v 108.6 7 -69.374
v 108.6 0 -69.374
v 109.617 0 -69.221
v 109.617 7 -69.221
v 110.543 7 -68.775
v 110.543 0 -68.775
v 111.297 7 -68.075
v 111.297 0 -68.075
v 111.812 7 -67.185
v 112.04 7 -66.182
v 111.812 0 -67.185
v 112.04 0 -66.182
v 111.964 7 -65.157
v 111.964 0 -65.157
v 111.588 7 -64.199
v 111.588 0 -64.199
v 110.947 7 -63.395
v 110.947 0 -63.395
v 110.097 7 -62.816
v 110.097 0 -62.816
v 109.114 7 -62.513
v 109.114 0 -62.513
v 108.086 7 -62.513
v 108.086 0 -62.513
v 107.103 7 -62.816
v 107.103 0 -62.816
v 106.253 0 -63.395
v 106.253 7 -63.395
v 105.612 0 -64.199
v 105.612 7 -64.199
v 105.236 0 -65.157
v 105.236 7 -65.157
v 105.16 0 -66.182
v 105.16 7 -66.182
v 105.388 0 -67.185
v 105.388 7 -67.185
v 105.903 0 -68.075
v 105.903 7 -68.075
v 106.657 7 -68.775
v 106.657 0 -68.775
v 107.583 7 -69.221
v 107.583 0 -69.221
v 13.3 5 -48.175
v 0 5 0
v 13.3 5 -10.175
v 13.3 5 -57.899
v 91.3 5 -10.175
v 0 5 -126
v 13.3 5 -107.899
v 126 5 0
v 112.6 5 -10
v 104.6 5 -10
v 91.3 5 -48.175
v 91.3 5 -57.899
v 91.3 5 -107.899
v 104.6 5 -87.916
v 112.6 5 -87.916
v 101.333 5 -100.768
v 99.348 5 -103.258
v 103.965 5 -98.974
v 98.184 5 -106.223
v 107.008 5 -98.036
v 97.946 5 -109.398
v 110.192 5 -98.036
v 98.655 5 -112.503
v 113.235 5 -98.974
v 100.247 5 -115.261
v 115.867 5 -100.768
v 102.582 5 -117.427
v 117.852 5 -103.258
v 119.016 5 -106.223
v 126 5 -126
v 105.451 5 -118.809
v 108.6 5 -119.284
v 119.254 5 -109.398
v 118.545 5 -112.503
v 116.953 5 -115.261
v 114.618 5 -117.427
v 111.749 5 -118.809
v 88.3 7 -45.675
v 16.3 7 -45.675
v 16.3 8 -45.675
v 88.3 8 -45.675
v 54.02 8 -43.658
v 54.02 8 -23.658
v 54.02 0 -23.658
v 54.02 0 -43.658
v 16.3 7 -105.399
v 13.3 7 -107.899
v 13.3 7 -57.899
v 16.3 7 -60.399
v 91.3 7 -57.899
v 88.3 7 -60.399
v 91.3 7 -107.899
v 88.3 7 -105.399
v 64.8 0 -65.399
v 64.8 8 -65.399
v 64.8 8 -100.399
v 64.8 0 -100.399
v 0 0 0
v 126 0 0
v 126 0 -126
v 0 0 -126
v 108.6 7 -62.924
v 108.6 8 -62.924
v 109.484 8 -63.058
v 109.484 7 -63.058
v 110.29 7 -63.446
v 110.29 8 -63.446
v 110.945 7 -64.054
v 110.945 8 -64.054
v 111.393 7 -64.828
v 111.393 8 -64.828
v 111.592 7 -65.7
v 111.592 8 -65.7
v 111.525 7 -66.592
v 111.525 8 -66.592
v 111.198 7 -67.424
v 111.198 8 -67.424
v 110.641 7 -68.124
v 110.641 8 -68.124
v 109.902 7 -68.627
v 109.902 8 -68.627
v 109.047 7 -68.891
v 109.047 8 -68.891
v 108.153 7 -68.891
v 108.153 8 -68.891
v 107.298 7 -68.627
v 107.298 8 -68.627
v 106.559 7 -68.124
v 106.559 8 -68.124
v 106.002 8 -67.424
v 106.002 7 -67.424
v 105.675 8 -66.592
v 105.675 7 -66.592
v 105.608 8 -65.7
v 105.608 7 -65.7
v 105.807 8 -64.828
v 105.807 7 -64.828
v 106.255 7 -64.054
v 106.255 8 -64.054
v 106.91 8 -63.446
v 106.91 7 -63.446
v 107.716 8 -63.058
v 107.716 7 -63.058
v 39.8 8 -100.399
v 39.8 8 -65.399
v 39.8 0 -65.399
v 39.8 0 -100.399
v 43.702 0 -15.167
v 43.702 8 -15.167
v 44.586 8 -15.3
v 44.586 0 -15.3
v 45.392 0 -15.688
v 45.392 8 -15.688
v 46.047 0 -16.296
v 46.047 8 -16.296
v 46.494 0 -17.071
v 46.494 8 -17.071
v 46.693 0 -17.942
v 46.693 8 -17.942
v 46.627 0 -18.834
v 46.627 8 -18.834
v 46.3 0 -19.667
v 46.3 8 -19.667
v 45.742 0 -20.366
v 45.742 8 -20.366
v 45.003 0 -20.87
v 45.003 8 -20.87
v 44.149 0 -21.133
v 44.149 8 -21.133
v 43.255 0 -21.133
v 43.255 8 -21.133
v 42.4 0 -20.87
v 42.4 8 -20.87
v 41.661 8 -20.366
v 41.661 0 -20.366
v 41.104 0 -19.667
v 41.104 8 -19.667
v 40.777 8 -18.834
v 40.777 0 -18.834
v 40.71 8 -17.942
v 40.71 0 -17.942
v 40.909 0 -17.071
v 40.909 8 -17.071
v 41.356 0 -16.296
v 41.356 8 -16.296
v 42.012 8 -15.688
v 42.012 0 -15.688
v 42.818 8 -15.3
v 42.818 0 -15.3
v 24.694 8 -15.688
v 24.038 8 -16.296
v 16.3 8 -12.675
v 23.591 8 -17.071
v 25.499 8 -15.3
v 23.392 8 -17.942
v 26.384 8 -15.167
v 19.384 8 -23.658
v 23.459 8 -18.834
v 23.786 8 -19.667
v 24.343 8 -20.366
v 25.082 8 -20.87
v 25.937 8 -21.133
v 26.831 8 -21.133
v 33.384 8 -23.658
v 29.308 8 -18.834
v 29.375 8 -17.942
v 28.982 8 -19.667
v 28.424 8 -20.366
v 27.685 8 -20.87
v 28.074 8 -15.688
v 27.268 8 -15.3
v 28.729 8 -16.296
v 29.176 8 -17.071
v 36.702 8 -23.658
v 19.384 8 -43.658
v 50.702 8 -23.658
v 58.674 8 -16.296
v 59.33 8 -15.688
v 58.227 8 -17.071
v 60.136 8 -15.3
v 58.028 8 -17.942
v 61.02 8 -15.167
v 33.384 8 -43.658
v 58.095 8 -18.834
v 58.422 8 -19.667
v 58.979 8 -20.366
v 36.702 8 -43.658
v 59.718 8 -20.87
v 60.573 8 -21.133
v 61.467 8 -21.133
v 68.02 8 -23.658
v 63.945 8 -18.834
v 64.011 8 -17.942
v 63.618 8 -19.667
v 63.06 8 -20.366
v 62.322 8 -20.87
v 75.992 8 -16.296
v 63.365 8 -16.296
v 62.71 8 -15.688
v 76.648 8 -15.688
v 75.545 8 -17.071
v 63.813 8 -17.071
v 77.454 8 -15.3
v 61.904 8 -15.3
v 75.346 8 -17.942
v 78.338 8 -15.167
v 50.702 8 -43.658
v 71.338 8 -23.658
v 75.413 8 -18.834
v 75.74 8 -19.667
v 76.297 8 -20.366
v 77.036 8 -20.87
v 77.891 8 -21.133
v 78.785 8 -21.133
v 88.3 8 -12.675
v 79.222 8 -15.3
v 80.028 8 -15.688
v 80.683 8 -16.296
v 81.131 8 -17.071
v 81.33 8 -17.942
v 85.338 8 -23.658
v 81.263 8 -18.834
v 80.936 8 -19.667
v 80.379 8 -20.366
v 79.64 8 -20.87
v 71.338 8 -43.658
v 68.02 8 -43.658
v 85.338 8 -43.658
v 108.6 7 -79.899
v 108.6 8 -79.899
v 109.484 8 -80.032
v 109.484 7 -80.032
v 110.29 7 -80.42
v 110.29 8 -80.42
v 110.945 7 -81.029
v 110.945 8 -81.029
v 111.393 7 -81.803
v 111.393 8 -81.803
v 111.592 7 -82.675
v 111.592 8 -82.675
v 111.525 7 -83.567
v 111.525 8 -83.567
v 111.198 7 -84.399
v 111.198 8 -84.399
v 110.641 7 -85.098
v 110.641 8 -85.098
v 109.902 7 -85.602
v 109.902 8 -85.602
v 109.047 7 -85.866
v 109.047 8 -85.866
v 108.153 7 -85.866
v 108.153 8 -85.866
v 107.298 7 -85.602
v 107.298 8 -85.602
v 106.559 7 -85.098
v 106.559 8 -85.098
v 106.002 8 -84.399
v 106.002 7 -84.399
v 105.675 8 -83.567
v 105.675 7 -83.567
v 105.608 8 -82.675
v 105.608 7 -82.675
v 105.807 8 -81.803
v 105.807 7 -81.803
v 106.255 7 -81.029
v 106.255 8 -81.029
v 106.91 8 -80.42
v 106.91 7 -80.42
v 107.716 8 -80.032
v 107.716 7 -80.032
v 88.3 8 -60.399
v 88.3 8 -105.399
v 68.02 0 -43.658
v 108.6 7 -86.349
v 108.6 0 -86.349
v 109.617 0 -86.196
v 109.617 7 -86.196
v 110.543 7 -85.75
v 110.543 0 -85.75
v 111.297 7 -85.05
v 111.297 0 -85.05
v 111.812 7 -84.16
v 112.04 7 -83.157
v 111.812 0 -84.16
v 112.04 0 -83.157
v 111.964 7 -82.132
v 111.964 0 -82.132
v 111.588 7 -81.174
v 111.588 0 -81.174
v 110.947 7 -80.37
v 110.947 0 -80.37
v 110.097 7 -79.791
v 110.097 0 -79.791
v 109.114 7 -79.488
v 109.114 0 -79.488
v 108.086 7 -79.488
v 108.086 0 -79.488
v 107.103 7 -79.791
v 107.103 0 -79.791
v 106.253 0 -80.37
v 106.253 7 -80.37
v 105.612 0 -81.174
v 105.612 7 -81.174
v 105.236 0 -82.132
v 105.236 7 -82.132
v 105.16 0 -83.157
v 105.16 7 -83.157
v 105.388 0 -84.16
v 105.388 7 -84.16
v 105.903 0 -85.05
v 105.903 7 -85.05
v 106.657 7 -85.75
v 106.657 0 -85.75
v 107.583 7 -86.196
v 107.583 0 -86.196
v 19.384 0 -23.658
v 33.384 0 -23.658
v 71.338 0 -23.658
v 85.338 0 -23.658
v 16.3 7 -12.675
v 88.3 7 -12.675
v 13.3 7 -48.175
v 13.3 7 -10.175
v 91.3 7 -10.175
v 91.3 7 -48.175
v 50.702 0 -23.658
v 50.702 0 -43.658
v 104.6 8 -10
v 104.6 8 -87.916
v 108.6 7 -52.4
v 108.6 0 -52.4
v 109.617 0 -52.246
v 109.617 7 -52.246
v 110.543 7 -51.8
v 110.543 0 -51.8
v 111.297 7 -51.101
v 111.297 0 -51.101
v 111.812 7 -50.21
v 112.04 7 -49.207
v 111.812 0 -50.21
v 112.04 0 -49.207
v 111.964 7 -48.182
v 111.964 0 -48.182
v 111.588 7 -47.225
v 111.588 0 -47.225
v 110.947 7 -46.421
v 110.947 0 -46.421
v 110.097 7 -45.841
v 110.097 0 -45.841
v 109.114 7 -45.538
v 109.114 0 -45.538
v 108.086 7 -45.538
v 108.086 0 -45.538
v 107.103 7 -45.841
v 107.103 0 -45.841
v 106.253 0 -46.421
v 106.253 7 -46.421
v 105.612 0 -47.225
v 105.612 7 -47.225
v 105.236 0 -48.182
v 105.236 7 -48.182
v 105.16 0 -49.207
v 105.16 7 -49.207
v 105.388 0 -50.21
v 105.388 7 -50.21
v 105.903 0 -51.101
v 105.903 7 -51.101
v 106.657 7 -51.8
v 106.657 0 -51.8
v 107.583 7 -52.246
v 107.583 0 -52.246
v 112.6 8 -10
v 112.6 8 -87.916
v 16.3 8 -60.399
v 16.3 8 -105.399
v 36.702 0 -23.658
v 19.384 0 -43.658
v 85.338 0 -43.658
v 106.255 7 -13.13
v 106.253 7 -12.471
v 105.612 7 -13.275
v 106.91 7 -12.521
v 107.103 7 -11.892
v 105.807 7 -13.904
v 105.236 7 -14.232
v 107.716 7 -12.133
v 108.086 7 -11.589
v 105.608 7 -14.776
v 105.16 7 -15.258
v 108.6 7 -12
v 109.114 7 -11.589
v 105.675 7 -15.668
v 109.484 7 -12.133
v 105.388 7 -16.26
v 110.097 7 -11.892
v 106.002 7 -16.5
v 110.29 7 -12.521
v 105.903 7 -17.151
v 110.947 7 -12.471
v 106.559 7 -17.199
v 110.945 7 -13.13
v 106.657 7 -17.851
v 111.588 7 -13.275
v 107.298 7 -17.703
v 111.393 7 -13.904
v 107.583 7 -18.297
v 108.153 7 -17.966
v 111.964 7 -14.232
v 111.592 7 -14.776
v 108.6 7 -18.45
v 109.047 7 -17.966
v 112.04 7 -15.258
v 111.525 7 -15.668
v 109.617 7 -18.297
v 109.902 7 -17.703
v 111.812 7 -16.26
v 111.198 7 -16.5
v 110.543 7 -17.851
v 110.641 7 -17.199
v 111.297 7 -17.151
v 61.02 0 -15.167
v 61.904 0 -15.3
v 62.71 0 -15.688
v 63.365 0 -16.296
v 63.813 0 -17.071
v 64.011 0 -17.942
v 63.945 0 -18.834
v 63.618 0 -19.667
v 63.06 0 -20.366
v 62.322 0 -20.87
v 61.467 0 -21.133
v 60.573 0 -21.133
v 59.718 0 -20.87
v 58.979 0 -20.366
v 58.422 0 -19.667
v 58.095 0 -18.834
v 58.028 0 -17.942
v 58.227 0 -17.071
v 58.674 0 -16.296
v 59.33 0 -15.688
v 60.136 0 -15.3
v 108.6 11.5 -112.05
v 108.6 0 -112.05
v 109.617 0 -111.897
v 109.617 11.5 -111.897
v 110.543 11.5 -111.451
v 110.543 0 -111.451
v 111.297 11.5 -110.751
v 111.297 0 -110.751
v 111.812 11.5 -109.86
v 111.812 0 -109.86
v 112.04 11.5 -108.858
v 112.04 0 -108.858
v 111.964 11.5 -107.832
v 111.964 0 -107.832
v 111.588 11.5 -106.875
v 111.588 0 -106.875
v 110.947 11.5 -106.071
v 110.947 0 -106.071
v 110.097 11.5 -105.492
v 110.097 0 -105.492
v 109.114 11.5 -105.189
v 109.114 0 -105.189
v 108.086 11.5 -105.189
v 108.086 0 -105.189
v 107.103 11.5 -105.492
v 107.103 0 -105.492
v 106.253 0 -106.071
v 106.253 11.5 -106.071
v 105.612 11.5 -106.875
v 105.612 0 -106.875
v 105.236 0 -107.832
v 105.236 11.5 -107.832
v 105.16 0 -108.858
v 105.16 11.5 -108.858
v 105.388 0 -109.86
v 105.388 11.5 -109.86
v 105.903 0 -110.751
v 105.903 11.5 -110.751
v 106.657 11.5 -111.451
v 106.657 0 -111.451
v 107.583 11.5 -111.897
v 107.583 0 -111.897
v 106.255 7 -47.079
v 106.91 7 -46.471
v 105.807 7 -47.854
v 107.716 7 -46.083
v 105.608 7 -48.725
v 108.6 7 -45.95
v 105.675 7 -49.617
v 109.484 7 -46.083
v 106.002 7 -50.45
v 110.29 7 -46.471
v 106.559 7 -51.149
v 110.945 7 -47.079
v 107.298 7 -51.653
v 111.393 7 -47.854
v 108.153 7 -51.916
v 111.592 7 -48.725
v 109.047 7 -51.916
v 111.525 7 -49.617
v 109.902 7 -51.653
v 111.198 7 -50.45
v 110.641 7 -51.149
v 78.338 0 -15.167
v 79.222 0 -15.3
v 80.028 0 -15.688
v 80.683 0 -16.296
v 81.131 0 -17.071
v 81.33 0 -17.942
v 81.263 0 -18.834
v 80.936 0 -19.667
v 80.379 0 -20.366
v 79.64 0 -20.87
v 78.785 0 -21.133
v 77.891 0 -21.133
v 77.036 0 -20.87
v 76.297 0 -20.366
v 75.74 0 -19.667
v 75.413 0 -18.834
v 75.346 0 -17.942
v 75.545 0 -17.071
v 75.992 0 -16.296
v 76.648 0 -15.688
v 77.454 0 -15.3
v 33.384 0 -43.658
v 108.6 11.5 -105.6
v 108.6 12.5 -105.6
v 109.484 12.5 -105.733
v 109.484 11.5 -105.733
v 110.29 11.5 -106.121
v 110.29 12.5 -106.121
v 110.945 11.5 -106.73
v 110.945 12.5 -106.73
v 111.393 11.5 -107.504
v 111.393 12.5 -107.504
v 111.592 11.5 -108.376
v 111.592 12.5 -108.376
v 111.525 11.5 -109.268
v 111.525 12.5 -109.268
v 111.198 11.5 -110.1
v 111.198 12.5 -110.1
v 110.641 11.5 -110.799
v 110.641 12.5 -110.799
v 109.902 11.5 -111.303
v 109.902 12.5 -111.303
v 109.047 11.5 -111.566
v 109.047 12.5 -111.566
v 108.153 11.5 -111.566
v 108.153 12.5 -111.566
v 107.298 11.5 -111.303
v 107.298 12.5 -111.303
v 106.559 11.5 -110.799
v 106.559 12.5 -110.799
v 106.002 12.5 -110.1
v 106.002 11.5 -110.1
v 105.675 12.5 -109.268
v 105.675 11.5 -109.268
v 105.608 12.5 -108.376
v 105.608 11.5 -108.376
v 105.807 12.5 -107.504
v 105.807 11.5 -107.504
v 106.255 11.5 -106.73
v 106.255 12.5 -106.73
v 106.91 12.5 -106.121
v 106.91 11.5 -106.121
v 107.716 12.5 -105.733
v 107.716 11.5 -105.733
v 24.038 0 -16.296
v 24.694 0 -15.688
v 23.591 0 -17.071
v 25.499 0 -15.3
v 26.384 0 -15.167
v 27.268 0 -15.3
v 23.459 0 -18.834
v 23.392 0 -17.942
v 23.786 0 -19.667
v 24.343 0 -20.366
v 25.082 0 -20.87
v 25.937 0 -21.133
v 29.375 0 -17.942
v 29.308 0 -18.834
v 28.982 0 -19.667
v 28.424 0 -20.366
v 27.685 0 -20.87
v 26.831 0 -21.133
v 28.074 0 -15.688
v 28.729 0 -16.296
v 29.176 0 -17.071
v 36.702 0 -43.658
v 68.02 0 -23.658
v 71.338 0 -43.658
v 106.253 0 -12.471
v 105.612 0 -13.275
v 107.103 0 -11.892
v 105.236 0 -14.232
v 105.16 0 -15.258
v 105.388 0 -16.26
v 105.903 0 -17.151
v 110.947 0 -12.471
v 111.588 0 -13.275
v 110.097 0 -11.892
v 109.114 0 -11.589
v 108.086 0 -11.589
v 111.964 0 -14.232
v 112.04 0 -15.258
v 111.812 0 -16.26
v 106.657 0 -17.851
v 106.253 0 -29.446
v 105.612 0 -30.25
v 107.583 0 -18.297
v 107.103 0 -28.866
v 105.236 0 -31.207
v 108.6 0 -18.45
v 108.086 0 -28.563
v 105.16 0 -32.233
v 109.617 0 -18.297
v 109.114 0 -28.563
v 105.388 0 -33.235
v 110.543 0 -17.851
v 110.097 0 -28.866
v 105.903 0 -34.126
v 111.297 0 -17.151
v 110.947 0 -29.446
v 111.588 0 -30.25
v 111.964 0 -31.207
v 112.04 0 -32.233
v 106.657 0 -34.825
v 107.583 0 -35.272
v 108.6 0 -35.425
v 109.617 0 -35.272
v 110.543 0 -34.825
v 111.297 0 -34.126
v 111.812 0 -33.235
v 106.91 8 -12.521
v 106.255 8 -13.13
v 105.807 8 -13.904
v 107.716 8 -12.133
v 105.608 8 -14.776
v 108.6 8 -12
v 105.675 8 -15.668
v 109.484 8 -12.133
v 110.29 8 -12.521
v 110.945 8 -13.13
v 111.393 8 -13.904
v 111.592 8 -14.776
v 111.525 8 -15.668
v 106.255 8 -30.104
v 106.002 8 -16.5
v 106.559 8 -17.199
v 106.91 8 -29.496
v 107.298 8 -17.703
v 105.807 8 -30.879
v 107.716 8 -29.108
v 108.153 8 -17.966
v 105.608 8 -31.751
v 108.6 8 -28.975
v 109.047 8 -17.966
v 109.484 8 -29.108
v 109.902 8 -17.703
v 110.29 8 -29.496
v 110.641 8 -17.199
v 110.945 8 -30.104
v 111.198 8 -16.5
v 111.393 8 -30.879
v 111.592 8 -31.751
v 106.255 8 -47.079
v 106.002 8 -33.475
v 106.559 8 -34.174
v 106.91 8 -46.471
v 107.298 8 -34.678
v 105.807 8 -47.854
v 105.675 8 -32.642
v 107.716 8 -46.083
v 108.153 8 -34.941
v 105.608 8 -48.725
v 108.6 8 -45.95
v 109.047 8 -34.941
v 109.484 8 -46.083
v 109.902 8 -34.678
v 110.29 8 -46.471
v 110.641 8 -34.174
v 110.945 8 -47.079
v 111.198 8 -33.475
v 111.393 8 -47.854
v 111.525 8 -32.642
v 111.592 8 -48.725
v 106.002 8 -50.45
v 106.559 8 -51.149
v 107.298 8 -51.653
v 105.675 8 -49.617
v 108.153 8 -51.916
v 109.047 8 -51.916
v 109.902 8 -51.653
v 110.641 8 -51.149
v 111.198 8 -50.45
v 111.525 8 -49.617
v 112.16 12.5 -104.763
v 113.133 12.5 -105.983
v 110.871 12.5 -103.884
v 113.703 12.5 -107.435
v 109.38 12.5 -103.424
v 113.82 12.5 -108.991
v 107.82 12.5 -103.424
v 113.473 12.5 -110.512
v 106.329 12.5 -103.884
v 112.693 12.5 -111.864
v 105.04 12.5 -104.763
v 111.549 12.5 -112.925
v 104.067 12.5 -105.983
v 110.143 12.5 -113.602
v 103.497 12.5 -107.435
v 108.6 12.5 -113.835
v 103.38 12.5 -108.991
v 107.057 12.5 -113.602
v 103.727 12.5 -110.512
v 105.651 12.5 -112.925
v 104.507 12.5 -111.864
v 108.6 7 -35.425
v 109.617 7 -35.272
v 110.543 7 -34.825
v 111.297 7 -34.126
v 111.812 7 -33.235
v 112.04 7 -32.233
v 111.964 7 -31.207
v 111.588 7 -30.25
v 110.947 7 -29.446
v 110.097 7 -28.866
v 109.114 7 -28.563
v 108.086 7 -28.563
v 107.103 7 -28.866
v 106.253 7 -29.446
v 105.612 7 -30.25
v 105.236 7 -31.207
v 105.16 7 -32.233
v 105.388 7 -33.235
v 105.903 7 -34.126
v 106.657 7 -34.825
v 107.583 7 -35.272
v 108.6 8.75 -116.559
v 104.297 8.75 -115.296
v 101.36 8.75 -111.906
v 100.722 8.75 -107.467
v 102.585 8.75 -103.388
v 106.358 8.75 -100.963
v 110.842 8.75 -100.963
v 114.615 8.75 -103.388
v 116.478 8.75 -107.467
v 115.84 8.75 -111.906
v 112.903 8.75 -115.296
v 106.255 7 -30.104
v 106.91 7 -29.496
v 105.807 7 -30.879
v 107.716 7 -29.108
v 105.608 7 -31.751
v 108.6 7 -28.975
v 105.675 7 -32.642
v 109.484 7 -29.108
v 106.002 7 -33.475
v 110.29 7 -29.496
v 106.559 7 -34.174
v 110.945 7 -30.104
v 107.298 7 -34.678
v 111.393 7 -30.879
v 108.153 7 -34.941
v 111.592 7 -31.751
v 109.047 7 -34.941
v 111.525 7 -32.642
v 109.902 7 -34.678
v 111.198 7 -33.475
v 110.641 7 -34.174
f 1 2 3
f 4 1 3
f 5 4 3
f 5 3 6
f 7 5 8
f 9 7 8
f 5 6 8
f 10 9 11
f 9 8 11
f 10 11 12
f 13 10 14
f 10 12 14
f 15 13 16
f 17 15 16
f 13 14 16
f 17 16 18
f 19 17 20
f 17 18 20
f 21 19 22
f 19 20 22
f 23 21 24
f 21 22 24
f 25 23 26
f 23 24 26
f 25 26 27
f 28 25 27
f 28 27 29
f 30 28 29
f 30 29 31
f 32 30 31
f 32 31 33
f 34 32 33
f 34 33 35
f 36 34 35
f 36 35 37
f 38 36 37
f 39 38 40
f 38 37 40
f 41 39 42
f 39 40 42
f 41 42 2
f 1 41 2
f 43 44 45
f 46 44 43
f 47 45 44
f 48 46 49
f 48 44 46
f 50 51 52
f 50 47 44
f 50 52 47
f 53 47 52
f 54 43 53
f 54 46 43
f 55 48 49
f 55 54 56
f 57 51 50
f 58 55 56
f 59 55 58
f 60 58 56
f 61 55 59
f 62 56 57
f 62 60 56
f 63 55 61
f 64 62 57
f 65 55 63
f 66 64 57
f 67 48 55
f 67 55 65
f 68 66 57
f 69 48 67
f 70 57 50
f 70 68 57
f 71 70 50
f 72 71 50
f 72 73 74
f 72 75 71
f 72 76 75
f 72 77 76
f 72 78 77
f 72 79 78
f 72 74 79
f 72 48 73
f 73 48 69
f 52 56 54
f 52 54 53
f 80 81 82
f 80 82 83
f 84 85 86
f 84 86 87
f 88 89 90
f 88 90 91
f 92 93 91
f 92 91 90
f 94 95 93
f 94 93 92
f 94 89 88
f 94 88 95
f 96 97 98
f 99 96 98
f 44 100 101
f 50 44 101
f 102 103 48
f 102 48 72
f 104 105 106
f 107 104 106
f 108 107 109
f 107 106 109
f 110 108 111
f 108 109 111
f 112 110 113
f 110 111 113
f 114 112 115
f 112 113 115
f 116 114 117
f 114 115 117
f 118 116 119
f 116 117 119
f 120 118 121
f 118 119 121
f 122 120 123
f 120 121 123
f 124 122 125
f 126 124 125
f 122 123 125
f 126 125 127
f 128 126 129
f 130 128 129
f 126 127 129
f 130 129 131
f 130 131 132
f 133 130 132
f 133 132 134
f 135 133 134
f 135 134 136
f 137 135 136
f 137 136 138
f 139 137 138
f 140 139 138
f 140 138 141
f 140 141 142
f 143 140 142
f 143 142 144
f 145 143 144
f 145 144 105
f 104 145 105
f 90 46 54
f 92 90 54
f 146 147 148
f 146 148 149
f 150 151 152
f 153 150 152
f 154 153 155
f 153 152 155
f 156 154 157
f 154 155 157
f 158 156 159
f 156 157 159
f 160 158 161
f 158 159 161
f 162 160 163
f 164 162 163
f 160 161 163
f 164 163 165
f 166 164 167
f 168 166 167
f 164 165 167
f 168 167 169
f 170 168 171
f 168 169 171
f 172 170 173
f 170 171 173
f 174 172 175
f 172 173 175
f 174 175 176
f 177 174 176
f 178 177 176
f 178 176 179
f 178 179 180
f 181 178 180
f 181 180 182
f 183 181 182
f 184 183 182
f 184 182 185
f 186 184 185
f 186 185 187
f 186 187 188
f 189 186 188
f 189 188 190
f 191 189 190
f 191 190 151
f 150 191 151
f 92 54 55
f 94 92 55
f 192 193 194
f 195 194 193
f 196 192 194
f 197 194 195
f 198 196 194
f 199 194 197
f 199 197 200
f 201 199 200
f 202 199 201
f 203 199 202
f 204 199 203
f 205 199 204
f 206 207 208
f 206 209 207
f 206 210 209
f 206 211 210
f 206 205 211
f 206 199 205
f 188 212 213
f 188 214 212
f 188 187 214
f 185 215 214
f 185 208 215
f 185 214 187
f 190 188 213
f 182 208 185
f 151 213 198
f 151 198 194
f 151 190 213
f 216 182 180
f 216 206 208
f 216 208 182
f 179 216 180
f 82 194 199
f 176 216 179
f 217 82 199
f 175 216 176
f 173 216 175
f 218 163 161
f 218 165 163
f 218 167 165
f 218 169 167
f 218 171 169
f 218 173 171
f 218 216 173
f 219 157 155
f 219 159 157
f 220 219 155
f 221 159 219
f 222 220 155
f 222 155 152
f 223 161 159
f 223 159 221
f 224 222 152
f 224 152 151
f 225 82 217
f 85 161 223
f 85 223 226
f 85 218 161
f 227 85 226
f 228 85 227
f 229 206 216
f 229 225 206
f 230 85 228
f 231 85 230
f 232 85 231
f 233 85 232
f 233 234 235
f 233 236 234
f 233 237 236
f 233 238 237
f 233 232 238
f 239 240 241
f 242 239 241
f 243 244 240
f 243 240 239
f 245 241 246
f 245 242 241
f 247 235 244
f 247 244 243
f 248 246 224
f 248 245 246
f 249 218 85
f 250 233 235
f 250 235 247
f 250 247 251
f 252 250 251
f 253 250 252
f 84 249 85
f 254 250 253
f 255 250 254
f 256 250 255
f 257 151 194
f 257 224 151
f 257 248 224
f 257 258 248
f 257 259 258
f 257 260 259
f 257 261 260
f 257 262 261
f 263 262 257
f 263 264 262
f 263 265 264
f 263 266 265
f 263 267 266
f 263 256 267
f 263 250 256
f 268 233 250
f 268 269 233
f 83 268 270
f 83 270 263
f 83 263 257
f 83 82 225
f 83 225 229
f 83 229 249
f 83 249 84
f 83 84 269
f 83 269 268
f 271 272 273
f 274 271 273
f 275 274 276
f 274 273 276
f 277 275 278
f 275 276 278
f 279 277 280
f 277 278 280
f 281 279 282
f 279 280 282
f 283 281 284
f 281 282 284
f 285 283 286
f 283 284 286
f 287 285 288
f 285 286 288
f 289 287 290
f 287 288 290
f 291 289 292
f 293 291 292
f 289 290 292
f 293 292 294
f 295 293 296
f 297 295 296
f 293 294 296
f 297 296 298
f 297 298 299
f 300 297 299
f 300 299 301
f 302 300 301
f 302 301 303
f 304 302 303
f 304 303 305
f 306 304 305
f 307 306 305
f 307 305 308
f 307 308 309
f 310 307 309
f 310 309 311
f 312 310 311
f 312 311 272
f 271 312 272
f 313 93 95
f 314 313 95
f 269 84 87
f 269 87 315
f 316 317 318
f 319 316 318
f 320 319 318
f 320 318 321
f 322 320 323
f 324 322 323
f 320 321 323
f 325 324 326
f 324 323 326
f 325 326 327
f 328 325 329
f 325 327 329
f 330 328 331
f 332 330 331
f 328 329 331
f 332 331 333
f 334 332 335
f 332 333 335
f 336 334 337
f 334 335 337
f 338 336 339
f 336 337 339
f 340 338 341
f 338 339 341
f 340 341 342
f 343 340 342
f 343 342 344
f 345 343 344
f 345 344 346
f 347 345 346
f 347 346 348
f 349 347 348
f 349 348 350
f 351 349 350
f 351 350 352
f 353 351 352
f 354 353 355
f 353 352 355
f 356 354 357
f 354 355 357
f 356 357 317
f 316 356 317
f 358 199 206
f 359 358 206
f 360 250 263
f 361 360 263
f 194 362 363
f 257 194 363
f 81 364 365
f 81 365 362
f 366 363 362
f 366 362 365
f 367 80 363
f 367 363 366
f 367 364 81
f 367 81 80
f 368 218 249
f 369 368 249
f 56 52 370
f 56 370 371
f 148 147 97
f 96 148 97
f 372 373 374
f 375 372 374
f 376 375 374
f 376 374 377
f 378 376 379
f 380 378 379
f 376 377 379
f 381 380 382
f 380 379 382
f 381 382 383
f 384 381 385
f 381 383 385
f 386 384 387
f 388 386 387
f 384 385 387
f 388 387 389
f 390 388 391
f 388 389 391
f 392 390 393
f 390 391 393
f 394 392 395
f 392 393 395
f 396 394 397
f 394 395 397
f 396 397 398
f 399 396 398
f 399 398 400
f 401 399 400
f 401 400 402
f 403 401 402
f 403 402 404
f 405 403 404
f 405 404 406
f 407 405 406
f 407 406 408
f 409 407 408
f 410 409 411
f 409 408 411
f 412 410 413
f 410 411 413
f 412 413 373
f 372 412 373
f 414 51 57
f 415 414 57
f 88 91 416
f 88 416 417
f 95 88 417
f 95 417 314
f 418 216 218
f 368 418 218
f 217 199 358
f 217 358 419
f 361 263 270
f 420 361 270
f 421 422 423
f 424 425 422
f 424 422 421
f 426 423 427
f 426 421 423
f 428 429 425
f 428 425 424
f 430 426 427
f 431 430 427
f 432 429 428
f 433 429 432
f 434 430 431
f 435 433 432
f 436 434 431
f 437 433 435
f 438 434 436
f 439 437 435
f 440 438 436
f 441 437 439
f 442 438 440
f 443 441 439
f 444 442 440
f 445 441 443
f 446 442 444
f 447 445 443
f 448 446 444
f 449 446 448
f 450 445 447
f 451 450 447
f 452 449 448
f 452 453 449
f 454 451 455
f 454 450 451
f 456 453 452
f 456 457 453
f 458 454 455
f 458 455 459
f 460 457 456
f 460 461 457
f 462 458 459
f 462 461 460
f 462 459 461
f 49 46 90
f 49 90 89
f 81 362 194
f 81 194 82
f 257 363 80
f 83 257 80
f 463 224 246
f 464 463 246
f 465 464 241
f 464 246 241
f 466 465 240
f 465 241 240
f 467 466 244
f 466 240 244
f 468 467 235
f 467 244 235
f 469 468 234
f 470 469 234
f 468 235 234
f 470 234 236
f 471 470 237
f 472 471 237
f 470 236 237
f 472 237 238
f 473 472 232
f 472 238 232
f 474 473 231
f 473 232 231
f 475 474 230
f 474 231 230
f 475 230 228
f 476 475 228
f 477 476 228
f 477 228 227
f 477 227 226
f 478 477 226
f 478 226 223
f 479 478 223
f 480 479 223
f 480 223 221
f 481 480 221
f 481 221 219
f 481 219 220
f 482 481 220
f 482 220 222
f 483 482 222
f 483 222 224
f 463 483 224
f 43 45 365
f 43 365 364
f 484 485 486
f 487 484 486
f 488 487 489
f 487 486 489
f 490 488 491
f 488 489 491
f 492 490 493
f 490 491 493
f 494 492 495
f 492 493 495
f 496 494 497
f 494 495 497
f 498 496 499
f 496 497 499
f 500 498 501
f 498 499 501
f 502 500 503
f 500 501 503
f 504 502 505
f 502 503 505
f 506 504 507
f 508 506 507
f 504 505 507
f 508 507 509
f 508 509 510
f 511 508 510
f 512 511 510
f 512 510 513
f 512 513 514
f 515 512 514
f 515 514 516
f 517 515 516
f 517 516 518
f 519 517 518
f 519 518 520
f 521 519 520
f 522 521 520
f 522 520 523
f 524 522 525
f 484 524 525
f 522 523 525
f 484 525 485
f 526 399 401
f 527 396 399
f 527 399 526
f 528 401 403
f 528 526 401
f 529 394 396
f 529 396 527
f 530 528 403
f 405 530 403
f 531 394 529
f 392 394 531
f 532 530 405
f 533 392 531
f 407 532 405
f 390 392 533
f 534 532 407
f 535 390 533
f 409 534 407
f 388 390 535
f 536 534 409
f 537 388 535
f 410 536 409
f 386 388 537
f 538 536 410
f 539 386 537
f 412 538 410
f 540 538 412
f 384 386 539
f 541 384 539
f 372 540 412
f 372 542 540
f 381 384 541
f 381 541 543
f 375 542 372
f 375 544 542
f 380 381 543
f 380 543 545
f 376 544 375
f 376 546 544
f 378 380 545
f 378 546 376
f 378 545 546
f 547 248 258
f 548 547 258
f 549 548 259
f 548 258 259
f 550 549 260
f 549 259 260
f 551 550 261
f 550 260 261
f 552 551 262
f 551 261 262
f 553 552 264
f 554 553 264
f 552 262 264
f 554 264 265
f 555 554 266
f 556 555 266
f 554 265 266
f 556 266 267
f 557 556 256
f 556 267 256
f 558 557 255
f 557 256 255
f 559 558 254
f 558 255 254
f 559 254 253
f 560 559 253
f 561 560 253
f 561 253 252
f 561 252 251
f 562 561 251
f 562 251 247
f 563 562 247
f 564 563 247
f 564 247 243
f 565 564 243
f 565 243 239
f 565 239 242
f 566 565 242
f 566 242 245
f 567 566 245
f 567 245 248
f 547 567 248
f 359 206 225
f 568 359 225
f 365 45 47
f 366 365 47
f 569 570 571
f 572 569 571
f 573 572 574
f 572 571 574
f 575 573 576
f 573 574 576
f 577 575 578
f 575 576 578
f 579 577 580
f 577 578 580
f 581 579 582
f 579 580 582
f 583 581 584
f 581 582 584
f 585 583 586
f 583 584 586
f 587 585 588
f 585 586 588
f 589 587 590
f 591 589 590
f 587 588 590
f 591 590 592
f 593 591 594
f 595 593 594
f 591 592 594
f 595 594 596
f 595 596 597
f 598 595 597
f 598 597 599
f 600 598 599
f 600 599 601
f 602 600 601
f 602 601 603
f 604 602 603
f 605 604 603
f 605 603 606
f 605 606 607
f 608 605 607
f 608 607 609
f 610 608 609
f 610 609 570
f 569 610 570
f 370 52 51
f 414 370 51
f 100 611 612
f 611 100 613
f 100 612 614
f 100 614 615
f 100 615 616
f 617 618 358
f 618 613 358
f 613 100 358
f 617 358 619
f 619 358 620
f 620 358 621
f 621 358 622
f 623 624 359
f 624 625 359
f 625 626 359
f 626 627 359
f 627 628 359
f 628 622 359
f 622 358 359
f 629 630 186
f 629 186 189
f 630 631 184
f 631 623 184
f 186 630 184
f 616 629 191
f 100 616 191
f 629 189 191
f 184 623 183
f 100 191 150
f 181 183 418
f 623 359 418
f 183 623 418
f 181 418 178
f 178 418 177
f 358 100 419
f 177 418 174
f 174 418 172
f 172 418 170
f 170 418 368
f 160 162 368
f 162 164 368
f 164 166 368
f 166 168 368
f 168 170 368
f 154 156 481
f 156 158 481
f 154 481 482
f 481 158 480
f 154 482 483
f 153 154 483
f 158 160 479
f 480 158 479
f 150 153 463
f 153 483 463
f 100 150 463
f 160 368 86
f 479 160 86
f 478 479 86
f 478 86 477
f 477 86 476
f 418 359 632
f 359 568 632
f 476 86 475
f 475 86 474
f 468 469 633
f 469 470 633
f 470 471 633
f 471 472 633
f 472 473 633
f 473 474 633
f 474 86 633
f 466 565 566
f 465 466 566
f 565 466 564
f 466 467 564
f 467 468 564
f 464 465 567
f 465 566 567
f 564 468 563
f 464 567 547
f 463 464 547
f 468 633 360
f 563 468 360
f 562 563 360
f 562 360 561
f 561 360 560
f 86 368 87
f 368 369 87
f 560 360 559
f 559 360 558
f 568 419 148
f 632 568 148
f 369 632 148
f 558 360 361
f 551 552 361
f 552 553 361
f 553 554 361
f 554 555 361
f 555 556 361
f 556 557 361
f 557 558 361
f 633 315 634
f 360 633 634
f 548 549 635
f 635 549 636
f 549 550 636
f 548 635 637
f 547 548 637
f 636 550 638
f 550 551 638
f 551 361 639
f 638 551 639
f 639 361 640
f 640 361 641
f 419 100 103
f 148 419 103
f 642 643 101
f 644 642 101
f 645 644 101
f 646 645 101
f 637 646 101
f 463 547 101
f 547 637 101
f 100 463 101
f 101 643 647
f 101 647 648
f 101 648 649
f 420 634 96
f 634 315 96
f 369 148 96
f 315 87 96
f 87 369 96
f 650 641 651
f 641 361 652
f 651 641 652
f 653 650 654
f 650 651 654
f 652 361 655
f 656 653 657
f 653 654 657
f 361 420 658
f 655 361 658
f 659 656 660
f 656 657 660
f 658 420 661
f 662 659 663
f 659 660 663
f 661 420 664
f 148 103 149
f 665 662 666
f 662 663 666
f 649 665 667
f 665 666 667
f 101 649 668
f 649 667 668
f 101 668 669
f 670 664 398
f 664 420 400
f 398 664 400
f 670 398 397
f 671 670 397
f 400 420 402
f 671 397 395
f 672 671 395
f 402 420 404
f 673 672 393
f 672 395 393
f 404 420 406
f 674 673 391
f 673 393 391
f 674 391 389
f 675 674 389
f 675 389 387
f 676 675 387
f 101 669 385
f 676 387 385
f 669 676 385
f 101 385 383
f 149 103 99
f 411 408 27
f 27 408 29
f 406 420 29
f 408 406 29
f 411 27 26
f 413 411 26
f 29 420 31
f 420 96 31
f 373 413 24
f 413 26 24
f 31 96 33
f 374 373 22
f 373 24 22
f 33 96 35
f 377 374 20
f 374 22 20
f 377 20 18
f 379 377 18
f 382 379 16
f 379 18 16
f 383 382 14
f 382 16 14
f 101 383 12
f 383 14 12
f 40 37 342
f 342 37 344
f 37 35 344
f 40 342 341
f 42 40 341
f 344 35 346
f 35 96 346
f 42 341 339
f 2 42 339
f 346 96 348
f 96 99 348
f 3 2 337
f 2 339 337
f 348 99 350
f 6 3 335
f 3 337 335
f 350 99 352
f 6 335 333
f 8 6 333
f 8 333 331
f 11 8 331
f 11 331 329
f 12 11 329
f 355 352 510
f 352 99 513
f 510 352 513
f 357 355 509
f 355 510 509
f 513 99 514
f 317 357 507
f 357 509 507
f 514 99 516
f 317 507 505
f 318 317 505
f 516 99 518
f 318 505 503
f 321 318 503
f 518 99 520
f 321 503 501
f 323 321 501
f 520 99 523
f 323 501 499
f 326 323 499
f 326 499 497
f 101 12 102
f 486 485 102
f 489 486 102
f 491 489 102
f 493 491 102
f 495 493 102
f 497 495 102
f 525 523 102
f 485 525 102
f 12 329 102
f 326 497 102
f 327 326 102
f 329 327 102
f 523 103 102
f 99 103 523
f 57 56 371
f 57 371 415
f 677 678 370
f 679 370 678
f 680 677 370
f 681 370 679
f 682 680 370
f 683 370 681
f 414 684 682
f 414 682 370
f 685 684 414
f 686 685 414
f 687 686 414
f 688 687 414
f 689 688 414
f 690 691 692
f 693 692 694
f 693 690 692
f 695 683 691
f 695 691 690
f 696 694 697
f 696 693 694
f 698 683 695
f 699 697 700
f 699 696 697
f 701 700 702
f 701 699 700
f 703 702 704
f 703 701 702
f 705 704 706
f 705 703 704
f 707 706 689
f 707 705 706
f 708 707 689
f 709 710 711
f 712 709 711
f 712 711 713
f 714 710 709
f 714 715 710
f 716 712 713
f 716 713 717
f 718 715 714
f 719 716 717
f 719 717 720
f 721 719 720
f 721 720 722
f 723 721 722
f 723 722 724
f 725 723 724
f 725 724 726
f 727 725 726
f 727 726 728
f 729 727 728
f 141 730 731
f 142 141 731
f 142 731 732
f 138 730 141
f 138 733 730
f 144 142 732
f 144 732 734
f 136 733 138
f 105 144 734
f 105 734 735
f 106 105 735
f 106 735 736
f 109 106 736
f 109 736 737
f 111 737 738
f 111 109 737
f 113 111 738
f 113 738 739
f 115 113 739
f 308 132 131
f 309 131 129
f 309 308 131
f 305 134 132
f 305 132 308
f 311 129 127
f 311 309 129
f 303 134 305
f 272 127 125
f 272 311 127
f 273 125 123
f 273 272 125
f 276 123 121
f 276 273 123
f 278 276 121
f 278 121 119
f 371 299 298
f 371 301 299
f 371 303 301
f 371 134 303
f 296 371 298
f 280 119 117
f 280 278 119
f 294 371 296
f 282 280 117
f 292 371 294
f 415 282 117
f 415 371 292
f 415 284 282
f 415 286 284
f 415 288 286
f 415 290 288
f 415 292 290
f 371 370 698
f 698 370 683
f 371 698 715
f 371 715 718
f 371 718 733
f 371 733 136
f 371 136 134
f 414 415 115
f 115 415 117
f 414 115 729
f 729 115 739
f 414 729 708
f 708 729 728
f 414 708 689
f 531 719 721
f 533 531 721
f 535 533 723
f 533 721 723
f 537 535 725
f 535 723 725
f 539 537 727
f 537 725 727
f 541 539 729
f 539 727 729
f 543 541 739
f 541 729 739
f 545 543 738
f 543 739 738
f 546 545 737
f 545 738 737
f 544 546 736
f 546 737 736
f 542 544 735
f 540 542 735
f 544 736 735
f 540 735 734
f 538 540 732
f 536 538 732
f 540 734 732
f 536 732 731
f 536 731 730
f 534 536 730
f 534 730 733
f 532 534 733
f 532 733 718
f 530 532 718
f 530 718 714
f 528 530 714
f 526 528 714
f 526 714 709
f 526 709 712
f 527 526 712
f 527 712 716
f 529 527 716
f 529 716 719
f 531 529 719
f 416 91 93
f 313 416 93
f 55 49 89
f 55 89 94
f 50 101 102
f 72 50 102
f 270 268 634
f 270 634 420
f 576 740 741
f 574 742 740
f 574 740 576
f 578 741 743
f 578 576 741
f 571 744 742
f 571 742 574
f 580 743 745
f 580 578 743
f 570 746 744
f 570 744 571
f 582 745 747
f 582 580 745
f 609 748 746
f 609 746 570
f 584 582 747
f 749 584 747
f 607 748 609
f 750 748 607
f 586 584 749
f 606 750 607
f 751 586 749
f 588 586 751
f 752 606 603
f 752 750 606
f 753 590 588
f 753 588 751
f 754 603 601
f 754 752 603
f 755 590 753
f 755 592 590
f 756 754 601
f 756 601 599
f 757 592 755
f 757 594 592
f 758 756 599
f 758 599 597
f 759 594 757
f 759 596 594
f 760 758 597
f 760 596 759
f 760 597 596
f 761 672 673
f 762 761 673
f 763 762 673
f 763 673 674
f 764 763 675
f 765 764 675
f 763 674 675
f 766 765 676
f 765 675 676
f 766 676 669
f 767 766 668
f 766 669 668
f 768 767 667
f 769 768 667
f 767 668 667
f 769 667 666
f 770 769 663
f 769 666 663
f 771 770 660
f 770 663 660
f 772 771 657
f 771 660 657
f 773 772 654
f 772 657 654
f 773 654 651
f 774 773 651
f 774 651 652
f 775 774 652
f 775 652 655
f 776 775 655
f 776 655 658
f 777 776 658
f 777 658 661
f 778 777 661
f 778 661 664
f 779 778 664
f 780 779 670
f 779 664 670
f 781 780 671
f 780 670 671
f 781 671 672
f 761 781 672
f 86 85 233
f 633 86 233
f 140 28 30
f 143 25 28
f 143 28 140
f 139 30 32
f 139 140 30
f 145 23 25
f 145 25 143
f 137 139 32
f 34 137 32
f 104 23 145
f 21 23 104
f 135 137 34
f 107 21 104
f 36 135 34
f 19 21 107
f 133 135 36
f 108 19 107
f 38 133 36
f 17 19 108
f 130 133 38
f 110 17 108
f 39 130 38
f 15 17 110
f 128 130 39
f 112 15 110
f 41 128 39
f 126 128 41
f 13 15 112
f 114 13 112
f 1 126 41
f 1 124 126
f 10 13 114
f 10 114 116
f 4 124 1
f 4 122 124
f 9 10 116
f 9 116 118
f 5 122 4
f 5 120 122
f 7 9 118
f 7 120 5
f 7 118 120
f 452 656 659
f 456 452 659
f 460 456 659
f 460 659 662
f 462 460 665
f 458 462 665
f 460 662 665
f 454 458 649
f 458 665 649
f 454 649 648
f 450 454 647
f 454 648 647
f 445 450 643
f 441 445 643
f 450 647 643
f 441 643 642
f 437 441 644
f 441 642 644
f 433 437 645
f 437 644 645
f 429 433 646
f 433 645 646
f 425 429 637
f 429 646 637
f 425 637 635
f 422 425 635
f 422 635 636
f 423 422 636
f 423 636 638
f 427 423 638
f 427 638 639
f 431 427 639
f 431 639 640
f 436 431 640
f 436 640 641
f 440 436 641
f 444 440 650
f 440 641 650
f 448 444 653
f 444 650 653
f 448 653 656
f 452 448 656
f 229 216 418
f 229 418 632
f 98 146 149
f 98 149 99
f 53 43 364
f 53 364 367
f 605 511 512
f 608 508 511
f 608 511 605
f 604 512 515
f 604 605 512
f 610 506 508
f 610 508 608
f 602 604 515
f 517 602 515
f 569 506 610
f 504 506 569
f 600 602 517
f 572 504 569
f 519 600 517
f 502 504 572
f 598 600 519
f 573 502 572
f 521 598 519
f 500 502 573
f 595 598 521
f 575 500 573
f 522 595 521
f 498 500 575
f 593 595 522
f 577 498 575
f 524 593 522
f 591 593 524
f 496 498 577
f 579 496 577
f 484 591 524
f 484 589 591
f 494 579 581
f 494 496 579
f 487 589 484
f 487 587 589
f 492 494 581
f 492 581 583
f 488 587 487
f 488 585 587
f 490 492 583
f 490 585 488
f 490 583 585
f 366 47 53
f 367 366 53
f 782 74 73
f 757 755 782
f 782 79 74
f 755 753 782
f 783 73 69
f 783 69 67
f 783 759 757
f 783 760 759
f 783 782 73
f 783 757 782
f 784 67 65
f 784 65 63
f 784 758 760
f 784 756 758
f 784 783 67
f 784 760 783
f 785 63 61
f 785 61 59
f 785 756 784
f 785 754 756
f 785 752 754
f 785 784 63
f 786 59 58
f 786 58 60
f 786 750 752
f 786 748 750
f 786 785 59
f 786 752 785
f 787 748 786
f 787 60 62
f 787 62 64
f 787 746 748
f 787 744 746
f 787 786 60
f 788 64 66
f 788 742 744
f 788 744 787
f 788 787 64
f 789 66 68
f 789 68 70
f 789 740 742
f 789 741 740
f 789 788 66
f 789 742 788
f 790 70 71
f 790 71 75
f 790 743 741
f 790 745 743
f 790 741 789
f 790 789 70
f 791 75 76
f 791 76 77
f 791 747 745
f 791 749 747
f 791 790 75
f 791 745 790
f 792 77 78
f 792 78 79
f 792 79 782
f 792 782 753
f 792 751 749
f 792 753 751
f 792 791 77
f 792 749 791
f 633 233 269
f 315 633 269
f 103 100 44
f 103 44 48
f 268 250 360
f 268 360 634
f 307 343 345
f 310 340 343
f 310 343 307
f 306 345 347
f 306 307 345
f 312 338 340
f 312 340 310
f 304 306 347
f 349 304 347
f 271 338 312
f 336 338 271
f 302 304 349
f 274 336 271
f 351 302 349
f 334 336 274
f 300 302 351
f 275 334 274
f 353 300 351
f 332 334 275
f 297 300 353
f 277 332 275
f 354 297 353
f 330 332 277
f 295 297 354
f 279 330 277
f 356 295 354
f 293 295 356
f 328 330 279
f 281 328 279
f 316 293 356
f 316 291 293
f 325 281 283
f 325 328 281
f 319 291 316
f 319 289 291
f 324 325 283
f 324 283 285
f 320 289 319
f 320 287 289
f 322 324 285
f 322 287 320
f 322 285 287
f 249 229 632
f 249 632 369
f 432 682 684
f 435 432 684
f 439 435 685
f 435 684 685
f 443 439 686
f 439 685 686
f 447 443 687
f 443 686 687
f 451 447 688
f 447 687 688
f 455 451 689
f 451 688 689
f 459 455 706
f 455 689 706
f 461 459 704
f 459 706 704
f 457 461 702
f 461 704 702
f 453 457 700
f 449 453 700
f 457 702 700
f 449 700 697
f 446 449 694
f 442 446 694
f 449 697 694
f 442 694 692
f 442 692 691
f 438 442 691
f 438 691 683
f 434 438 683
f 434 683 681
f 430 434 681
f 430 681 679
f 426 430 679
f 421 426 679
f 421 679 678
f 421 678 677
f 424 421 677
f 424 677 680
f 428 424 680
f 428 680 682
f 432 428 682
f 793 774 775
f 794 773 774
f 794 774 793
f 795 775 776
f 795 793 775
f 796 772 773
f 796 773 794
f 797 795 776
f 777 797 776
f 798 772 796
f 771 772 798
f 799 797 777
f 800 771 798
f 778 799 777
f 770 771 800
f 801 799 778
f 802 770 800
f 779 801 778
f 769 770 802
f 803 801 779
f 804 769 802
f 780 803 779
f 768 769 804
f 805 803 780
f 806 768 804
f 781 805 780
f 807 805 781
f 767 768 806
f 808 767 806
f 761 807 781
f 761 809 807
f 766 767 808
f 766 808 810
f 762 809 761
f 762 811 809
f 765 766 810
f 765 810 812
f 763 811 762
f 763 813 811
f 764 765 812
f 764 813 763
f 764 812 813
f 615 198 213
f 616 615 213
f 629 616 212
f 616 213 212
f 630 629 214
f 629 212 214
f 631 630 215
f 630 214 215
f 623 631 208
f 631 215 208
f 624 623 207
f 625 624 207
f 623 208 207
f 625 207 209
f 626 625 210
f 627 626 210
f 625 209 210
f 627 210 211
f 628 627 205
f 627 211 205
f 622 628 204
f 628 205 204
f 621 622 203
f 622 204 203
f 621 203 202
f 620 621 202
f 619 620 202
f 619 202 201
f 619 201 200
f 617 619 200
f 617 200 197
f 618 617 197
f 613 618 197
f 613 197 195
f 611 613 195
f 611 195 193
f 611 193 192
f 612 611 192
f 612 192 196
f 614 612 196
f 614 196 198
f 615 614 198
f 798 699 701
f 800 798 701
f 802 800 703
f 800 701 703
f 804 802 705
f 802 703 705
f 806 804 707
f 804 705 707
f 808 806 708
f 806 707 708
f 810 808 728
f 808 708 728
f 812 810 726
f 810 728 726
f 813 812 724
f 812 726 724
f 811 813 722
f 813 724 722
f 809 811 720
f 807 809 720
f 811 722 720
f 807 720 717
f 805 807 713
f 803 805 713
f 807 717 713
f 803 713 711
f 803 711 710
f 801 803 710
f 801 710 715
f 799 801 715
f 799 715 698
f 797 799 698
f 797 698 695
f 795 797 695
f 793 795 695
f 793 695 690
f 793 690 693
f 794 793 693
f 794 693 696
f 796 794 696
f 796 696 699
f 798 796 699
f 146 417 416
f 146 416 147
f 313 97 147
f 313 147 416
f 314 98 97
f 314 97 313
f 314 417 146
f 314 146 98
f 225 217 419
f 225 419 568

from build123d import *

# Parameters (mm, degrees)
SKETCH1_W           = 126
SKETCH1_H           = 126
BOSS_EXTRUDE1_DEPTH = 5
SKETCH3_R           = 12.5
BOSS_EXTRUDE2_DEPTH = 7.5
SKETCH4_R           = 3.45
CUT_EXTRUDE1_DEPTH  = 11.5
SKETCH6_R           = 3
CUT_EXTRUDE2_DEPTH  = 179.628805068
CHAMFER1_SIZE       = 10
CHAMFER1_SIZE_2     = 7.26542528
SKETCH7_W           = 8
SKETCH7_H           = 77.91635632
BOSS_EXTRUDE3_DEPTH = 3
SKETCH8_R           = 3
CUT_EXTRUDE3_DEPTH  = 179.370401132
SKETCH9_R           = 3.45
CUT_EXTRUDE4_DEPTH  = 7
SKETCH12_W          = 78
SKETCH12_H          = 50
SKETCH12_H_2        = 38
BOSS_EXTRUDE4_DEPTH = 2
SKETCH13_W          = 72
SKETCH13_H          = 45
BOSS_EXTRUDE5_DEPTH = 1
SKETCH14_W          = 72
SKETCH14_H          = 33
BOSS_EXTRUDE6_DEPTH = 1
SKETCH17_W          = 25
SKETCH17_H          = 35
CUT_EXTRUDE6_DEPTH  = 179.370401132
SKETCH18_W          = 14
SKETCH18_H          = 20
CUT_EXTRUDE7_DEPTH  = 179.370401132
SKETCH19_R          = 3
CUT_EXTRUDE8_DEPTH  = 179.370401132


with BuildPart() as part:
    # Sketch1 → Boss-Extrude1 (new body)
    with BuildSketch(Plane(origin=(0, 0, 0), x_dir=(1, 0, 0), z_dir=(0, 1, 0))):
        with Locations((63, 63)):
            Rectangle(SKETCH1_W, SKETCH1_H)
    extrude(amount=BOSS_EXTRUDE1_DEPTH)

    # Sketch3 → Boss-Extrude2 (add)
    with BuildSketch(Plane(origin=(0, 5, 0), x_dir=(1, 0, 0), z_dir=(0, 1, 0))):
        with Locations(Location((108.6, 108.6, 0), (0, 0, 90))):
            Circle(SKETCH3_R)
    extrude(amount=BOSS_EXTRUDE2_DEPTH)

    # Sketch4 → Cut-Extrude1 (cut)
    with BuildSketch(Plane.XZ):
        with Locations(Location((108.6, -108.6, 0), (0, 0, 270))):
            Circle(SKETCH4_R)
    extrude(amount=-CUT_EXTRUDE1_DEPTH, mode=Mode.SUBTRACT)

    # Sketch6 → Cut-Extrude2 (cut, through all)
    with BuildSketch(Plane(origin=(0, 12.5, 0), x_dir=(1, 0, 0), z_dir=(0, 1, 0))):
        with Locations(Location((108.6, 108.6, 0), (0, 0, 270))):
            Circle(SKETCH6_R)
    extrude(amount=-CUT_EXTRUDE2_DEPTH, mode=Mode.SUBTRACT)

    # Chamfer1
    # the kernel refuses this chamfer: 10, 7.26542528 mm, written as the material it takes off along each edge
    with BuildSketch(Plane(origin=(108.6, 12.5, -108.6), x_dir=(0, 0, -1), z_dir=(1, 0, 0))) as chamfer1_piece_1_section:
        Polygon((12.5, -CHAMFER1_SIZE), (12.5 - CHAMFER1_SIZE_2, 0), (12.5, 0), align=None)
    chamfer1_piece_1 = revolve(axis=Axis((108.6, 12.5, -108.6), (0, 1, 0)), mode=Mode.PRIVATE)
    chamfer1_piece_1 = split(chamfer1_piece_1, bisect_by=Plane(origin=(108.6, 5, -100.650989912), z_dir=(0, 1, 0)), keep=Keep.TOP, mode=Mode.PRIVATE)
    add(chamfer1_piece_1, mode=Mode.SUBTRACT)

    # Sketch7 → Boss-Extrude3 (add)
    with BuildSketch(Plane(origin=(0, 5, 0), x_dir=(1, 0, 0), z_dir=(0, 1, 0))):
        with Locations((108.6, 48.95817816)):
            Rectangle(SKETCH7_W, SKETCH7_H)
    extrude(amount=BOSS_EXTRUDE3_DEPTH)

    # Sketch8 → Cut-Extrude3 (cut, through all)
    with BuildSketch(Plane(origin=(0, 8, 0), x_dir=(1, 0, 0), z_dir=(0, 1, 0))):
        with Locations(Location((108.6, 15, 0), (0, 0, 270))):
            Circle(SKETCH8_R)
        with Locations(Location((108.6, 31.974801407, 0), (0, 0, 270))):
            Circle(SKETCH8_R)
        with Locations(Location((108.6, 48.949602814, 0), (0, 0, 270))):
            Circle(SKETCH8_R)
        with Locations(Location((108.6, 65.924404221, 0), (0, 0, 270))):
            Circle(SKETCH8_R)
        with Locations(Location((108.6, 82.899205628, 0), (0, 0, 270))):
            Circle(SKETCH8_R)
    extrude(amount=-CUT_EXTRUDE3_DEPTH, mode=Mode.SUBTRACT)

    # Sketch9 → Cut-Extrude4 (cut)
    with BuildSketch(Plane.XZ):
        with Locations(Location((108.6, -82.899205628, 0), (0, 0, 270))):
            Circle(SKETCH9_R)
        with Locations(Location((108.6, -65.924404221, 0), (0, 0, 270))):
            Circle(SKETCH9_R)
        with Locations(Location((108.6, -48.949602814, 0), (0, 0, 270))):
            Circle(SKETCH9_R)
        with Locations(Location((108.6, -15, 0), (0, 0, 270))):
            Circle(SKETCH9_R)
        with Locations(Location((108.6, -31.974801407, 0), (0, 0, 270))):
            Circle(SKETCH9_R)
    extrude(amount=-CUT_EXTRUDE4_DEPTH, mode=Mode.SUBTRACT)

    # Sketch12 → Boss-Extrude4 (add)
    with BuildSketch(Plane(origin=(0, 5, 0), x_dir=(1, 0, 0), z_dir=(0, 1, 0))):
        with Locations((52.3, 82.899205628)):
            Rectangle(SKETCH12_W, SKETCH12_H)
        with Locations((52.3, 29.174843528)):
            Rectangle(SKETCH12_W, SKETCH12_H_2)
    extrude(amount=BOSS_EXTRUDE4_DEPTH)

    # Sketch13 → Boss-Extrude5 (add)
    with BuildSketch(Plane(origin=(0, 7, 0), x_dir=(1, 0, 0), z_dir=(0, 1, 0))):
        with Locations((52.3, 82.899205628)):
            Rectangle(SKETCH13_W, SKETCH13_H)
    extrude(amount=BOSS_EXTRUDE5_DEPTH)

    # Sketch14 → Boss-Extrude6 (add)
    with BuildSketch(Plane(origin=(0, 7, 0), x_dir=(1, 0, 0), z_dir=(0, 1, 0))):
        with Locations((52.3, 29.174843528)):
            Rectangle(SKETCH14_W, SKETCH14_H)
    extrude(amount=BOSS_EXTRUDE6_DEPTH)

    # Sketch17 → Cut-Extrude6 (cut, through all)
    with BuildSketch(Plane(origin=(0, 8, 0), x_dir=(1, 0, 0), z_dir=(0, 1, 0))):
        with Locations((52.3, 82.899205628)):
            Rectangle(SKETCH17_W, SKETCH17_H)
    extrude(amount=-CUT_EXTRUDE6_DEPTH, mode=Mode.SUBTRACT)

    # Sketch18 → Cut-Extrude7 (cut, through all)
    with BuildSketch(Plane(origin=(0, 8, 0), x_dir=(1, 0, 0), z_dir=(0, 1, 0))):
        with Locations((43.701783173, 33.658480439)):
            Rectangle(SKETCH18_W, SKETCH18_H)
        with Locations((61.019882804, 33.658480439)):
            Rectangle(SKETCH18_W, SKETCH18_H)
        with Locations((78.337982434, 33.658480439)):
            Rectangle(SKETCH18_W, SKETCH18_H)
        with Locations((26.383683543, 33.658480439)):
            Rectangle(SKETCH18_W, SKETCH18_H)
    extrude(amount=-CUT_EXTRUDE7_DEPTH, mode=Mode.SUBTRACT)

    # Sketch19 → Cut-Extrude8 (cut, through all)
    with BuildSketch(Plane(origin=(0, 8, 0), x_dir=(1, 0, 0), z_dir=(0, 1, 0))):
        with Locations(Location((26.383683543, 18.166661984, 0), (0, 0, 270))):
            Circle(SKETCH19_R)
        with Locations(Location((43.701783173, 18.166661984, 0), (0, 0, 270))):
            Circle(SKETCH19_R)
        with Locations(Location((61.019882804, 18.166661984, 0), (0, 0, 270))):
            Circle(SKETCH19_R)
        with Locations(Location((78.337982434, 18.166661984, 0), (0, 0, 270))):
            Circle(SKETCH19_R)
    extrude(amount=-CUT_EXTRUDE8_DEPTH, mode=Mode.SUBTRACT)


solid = part.part
